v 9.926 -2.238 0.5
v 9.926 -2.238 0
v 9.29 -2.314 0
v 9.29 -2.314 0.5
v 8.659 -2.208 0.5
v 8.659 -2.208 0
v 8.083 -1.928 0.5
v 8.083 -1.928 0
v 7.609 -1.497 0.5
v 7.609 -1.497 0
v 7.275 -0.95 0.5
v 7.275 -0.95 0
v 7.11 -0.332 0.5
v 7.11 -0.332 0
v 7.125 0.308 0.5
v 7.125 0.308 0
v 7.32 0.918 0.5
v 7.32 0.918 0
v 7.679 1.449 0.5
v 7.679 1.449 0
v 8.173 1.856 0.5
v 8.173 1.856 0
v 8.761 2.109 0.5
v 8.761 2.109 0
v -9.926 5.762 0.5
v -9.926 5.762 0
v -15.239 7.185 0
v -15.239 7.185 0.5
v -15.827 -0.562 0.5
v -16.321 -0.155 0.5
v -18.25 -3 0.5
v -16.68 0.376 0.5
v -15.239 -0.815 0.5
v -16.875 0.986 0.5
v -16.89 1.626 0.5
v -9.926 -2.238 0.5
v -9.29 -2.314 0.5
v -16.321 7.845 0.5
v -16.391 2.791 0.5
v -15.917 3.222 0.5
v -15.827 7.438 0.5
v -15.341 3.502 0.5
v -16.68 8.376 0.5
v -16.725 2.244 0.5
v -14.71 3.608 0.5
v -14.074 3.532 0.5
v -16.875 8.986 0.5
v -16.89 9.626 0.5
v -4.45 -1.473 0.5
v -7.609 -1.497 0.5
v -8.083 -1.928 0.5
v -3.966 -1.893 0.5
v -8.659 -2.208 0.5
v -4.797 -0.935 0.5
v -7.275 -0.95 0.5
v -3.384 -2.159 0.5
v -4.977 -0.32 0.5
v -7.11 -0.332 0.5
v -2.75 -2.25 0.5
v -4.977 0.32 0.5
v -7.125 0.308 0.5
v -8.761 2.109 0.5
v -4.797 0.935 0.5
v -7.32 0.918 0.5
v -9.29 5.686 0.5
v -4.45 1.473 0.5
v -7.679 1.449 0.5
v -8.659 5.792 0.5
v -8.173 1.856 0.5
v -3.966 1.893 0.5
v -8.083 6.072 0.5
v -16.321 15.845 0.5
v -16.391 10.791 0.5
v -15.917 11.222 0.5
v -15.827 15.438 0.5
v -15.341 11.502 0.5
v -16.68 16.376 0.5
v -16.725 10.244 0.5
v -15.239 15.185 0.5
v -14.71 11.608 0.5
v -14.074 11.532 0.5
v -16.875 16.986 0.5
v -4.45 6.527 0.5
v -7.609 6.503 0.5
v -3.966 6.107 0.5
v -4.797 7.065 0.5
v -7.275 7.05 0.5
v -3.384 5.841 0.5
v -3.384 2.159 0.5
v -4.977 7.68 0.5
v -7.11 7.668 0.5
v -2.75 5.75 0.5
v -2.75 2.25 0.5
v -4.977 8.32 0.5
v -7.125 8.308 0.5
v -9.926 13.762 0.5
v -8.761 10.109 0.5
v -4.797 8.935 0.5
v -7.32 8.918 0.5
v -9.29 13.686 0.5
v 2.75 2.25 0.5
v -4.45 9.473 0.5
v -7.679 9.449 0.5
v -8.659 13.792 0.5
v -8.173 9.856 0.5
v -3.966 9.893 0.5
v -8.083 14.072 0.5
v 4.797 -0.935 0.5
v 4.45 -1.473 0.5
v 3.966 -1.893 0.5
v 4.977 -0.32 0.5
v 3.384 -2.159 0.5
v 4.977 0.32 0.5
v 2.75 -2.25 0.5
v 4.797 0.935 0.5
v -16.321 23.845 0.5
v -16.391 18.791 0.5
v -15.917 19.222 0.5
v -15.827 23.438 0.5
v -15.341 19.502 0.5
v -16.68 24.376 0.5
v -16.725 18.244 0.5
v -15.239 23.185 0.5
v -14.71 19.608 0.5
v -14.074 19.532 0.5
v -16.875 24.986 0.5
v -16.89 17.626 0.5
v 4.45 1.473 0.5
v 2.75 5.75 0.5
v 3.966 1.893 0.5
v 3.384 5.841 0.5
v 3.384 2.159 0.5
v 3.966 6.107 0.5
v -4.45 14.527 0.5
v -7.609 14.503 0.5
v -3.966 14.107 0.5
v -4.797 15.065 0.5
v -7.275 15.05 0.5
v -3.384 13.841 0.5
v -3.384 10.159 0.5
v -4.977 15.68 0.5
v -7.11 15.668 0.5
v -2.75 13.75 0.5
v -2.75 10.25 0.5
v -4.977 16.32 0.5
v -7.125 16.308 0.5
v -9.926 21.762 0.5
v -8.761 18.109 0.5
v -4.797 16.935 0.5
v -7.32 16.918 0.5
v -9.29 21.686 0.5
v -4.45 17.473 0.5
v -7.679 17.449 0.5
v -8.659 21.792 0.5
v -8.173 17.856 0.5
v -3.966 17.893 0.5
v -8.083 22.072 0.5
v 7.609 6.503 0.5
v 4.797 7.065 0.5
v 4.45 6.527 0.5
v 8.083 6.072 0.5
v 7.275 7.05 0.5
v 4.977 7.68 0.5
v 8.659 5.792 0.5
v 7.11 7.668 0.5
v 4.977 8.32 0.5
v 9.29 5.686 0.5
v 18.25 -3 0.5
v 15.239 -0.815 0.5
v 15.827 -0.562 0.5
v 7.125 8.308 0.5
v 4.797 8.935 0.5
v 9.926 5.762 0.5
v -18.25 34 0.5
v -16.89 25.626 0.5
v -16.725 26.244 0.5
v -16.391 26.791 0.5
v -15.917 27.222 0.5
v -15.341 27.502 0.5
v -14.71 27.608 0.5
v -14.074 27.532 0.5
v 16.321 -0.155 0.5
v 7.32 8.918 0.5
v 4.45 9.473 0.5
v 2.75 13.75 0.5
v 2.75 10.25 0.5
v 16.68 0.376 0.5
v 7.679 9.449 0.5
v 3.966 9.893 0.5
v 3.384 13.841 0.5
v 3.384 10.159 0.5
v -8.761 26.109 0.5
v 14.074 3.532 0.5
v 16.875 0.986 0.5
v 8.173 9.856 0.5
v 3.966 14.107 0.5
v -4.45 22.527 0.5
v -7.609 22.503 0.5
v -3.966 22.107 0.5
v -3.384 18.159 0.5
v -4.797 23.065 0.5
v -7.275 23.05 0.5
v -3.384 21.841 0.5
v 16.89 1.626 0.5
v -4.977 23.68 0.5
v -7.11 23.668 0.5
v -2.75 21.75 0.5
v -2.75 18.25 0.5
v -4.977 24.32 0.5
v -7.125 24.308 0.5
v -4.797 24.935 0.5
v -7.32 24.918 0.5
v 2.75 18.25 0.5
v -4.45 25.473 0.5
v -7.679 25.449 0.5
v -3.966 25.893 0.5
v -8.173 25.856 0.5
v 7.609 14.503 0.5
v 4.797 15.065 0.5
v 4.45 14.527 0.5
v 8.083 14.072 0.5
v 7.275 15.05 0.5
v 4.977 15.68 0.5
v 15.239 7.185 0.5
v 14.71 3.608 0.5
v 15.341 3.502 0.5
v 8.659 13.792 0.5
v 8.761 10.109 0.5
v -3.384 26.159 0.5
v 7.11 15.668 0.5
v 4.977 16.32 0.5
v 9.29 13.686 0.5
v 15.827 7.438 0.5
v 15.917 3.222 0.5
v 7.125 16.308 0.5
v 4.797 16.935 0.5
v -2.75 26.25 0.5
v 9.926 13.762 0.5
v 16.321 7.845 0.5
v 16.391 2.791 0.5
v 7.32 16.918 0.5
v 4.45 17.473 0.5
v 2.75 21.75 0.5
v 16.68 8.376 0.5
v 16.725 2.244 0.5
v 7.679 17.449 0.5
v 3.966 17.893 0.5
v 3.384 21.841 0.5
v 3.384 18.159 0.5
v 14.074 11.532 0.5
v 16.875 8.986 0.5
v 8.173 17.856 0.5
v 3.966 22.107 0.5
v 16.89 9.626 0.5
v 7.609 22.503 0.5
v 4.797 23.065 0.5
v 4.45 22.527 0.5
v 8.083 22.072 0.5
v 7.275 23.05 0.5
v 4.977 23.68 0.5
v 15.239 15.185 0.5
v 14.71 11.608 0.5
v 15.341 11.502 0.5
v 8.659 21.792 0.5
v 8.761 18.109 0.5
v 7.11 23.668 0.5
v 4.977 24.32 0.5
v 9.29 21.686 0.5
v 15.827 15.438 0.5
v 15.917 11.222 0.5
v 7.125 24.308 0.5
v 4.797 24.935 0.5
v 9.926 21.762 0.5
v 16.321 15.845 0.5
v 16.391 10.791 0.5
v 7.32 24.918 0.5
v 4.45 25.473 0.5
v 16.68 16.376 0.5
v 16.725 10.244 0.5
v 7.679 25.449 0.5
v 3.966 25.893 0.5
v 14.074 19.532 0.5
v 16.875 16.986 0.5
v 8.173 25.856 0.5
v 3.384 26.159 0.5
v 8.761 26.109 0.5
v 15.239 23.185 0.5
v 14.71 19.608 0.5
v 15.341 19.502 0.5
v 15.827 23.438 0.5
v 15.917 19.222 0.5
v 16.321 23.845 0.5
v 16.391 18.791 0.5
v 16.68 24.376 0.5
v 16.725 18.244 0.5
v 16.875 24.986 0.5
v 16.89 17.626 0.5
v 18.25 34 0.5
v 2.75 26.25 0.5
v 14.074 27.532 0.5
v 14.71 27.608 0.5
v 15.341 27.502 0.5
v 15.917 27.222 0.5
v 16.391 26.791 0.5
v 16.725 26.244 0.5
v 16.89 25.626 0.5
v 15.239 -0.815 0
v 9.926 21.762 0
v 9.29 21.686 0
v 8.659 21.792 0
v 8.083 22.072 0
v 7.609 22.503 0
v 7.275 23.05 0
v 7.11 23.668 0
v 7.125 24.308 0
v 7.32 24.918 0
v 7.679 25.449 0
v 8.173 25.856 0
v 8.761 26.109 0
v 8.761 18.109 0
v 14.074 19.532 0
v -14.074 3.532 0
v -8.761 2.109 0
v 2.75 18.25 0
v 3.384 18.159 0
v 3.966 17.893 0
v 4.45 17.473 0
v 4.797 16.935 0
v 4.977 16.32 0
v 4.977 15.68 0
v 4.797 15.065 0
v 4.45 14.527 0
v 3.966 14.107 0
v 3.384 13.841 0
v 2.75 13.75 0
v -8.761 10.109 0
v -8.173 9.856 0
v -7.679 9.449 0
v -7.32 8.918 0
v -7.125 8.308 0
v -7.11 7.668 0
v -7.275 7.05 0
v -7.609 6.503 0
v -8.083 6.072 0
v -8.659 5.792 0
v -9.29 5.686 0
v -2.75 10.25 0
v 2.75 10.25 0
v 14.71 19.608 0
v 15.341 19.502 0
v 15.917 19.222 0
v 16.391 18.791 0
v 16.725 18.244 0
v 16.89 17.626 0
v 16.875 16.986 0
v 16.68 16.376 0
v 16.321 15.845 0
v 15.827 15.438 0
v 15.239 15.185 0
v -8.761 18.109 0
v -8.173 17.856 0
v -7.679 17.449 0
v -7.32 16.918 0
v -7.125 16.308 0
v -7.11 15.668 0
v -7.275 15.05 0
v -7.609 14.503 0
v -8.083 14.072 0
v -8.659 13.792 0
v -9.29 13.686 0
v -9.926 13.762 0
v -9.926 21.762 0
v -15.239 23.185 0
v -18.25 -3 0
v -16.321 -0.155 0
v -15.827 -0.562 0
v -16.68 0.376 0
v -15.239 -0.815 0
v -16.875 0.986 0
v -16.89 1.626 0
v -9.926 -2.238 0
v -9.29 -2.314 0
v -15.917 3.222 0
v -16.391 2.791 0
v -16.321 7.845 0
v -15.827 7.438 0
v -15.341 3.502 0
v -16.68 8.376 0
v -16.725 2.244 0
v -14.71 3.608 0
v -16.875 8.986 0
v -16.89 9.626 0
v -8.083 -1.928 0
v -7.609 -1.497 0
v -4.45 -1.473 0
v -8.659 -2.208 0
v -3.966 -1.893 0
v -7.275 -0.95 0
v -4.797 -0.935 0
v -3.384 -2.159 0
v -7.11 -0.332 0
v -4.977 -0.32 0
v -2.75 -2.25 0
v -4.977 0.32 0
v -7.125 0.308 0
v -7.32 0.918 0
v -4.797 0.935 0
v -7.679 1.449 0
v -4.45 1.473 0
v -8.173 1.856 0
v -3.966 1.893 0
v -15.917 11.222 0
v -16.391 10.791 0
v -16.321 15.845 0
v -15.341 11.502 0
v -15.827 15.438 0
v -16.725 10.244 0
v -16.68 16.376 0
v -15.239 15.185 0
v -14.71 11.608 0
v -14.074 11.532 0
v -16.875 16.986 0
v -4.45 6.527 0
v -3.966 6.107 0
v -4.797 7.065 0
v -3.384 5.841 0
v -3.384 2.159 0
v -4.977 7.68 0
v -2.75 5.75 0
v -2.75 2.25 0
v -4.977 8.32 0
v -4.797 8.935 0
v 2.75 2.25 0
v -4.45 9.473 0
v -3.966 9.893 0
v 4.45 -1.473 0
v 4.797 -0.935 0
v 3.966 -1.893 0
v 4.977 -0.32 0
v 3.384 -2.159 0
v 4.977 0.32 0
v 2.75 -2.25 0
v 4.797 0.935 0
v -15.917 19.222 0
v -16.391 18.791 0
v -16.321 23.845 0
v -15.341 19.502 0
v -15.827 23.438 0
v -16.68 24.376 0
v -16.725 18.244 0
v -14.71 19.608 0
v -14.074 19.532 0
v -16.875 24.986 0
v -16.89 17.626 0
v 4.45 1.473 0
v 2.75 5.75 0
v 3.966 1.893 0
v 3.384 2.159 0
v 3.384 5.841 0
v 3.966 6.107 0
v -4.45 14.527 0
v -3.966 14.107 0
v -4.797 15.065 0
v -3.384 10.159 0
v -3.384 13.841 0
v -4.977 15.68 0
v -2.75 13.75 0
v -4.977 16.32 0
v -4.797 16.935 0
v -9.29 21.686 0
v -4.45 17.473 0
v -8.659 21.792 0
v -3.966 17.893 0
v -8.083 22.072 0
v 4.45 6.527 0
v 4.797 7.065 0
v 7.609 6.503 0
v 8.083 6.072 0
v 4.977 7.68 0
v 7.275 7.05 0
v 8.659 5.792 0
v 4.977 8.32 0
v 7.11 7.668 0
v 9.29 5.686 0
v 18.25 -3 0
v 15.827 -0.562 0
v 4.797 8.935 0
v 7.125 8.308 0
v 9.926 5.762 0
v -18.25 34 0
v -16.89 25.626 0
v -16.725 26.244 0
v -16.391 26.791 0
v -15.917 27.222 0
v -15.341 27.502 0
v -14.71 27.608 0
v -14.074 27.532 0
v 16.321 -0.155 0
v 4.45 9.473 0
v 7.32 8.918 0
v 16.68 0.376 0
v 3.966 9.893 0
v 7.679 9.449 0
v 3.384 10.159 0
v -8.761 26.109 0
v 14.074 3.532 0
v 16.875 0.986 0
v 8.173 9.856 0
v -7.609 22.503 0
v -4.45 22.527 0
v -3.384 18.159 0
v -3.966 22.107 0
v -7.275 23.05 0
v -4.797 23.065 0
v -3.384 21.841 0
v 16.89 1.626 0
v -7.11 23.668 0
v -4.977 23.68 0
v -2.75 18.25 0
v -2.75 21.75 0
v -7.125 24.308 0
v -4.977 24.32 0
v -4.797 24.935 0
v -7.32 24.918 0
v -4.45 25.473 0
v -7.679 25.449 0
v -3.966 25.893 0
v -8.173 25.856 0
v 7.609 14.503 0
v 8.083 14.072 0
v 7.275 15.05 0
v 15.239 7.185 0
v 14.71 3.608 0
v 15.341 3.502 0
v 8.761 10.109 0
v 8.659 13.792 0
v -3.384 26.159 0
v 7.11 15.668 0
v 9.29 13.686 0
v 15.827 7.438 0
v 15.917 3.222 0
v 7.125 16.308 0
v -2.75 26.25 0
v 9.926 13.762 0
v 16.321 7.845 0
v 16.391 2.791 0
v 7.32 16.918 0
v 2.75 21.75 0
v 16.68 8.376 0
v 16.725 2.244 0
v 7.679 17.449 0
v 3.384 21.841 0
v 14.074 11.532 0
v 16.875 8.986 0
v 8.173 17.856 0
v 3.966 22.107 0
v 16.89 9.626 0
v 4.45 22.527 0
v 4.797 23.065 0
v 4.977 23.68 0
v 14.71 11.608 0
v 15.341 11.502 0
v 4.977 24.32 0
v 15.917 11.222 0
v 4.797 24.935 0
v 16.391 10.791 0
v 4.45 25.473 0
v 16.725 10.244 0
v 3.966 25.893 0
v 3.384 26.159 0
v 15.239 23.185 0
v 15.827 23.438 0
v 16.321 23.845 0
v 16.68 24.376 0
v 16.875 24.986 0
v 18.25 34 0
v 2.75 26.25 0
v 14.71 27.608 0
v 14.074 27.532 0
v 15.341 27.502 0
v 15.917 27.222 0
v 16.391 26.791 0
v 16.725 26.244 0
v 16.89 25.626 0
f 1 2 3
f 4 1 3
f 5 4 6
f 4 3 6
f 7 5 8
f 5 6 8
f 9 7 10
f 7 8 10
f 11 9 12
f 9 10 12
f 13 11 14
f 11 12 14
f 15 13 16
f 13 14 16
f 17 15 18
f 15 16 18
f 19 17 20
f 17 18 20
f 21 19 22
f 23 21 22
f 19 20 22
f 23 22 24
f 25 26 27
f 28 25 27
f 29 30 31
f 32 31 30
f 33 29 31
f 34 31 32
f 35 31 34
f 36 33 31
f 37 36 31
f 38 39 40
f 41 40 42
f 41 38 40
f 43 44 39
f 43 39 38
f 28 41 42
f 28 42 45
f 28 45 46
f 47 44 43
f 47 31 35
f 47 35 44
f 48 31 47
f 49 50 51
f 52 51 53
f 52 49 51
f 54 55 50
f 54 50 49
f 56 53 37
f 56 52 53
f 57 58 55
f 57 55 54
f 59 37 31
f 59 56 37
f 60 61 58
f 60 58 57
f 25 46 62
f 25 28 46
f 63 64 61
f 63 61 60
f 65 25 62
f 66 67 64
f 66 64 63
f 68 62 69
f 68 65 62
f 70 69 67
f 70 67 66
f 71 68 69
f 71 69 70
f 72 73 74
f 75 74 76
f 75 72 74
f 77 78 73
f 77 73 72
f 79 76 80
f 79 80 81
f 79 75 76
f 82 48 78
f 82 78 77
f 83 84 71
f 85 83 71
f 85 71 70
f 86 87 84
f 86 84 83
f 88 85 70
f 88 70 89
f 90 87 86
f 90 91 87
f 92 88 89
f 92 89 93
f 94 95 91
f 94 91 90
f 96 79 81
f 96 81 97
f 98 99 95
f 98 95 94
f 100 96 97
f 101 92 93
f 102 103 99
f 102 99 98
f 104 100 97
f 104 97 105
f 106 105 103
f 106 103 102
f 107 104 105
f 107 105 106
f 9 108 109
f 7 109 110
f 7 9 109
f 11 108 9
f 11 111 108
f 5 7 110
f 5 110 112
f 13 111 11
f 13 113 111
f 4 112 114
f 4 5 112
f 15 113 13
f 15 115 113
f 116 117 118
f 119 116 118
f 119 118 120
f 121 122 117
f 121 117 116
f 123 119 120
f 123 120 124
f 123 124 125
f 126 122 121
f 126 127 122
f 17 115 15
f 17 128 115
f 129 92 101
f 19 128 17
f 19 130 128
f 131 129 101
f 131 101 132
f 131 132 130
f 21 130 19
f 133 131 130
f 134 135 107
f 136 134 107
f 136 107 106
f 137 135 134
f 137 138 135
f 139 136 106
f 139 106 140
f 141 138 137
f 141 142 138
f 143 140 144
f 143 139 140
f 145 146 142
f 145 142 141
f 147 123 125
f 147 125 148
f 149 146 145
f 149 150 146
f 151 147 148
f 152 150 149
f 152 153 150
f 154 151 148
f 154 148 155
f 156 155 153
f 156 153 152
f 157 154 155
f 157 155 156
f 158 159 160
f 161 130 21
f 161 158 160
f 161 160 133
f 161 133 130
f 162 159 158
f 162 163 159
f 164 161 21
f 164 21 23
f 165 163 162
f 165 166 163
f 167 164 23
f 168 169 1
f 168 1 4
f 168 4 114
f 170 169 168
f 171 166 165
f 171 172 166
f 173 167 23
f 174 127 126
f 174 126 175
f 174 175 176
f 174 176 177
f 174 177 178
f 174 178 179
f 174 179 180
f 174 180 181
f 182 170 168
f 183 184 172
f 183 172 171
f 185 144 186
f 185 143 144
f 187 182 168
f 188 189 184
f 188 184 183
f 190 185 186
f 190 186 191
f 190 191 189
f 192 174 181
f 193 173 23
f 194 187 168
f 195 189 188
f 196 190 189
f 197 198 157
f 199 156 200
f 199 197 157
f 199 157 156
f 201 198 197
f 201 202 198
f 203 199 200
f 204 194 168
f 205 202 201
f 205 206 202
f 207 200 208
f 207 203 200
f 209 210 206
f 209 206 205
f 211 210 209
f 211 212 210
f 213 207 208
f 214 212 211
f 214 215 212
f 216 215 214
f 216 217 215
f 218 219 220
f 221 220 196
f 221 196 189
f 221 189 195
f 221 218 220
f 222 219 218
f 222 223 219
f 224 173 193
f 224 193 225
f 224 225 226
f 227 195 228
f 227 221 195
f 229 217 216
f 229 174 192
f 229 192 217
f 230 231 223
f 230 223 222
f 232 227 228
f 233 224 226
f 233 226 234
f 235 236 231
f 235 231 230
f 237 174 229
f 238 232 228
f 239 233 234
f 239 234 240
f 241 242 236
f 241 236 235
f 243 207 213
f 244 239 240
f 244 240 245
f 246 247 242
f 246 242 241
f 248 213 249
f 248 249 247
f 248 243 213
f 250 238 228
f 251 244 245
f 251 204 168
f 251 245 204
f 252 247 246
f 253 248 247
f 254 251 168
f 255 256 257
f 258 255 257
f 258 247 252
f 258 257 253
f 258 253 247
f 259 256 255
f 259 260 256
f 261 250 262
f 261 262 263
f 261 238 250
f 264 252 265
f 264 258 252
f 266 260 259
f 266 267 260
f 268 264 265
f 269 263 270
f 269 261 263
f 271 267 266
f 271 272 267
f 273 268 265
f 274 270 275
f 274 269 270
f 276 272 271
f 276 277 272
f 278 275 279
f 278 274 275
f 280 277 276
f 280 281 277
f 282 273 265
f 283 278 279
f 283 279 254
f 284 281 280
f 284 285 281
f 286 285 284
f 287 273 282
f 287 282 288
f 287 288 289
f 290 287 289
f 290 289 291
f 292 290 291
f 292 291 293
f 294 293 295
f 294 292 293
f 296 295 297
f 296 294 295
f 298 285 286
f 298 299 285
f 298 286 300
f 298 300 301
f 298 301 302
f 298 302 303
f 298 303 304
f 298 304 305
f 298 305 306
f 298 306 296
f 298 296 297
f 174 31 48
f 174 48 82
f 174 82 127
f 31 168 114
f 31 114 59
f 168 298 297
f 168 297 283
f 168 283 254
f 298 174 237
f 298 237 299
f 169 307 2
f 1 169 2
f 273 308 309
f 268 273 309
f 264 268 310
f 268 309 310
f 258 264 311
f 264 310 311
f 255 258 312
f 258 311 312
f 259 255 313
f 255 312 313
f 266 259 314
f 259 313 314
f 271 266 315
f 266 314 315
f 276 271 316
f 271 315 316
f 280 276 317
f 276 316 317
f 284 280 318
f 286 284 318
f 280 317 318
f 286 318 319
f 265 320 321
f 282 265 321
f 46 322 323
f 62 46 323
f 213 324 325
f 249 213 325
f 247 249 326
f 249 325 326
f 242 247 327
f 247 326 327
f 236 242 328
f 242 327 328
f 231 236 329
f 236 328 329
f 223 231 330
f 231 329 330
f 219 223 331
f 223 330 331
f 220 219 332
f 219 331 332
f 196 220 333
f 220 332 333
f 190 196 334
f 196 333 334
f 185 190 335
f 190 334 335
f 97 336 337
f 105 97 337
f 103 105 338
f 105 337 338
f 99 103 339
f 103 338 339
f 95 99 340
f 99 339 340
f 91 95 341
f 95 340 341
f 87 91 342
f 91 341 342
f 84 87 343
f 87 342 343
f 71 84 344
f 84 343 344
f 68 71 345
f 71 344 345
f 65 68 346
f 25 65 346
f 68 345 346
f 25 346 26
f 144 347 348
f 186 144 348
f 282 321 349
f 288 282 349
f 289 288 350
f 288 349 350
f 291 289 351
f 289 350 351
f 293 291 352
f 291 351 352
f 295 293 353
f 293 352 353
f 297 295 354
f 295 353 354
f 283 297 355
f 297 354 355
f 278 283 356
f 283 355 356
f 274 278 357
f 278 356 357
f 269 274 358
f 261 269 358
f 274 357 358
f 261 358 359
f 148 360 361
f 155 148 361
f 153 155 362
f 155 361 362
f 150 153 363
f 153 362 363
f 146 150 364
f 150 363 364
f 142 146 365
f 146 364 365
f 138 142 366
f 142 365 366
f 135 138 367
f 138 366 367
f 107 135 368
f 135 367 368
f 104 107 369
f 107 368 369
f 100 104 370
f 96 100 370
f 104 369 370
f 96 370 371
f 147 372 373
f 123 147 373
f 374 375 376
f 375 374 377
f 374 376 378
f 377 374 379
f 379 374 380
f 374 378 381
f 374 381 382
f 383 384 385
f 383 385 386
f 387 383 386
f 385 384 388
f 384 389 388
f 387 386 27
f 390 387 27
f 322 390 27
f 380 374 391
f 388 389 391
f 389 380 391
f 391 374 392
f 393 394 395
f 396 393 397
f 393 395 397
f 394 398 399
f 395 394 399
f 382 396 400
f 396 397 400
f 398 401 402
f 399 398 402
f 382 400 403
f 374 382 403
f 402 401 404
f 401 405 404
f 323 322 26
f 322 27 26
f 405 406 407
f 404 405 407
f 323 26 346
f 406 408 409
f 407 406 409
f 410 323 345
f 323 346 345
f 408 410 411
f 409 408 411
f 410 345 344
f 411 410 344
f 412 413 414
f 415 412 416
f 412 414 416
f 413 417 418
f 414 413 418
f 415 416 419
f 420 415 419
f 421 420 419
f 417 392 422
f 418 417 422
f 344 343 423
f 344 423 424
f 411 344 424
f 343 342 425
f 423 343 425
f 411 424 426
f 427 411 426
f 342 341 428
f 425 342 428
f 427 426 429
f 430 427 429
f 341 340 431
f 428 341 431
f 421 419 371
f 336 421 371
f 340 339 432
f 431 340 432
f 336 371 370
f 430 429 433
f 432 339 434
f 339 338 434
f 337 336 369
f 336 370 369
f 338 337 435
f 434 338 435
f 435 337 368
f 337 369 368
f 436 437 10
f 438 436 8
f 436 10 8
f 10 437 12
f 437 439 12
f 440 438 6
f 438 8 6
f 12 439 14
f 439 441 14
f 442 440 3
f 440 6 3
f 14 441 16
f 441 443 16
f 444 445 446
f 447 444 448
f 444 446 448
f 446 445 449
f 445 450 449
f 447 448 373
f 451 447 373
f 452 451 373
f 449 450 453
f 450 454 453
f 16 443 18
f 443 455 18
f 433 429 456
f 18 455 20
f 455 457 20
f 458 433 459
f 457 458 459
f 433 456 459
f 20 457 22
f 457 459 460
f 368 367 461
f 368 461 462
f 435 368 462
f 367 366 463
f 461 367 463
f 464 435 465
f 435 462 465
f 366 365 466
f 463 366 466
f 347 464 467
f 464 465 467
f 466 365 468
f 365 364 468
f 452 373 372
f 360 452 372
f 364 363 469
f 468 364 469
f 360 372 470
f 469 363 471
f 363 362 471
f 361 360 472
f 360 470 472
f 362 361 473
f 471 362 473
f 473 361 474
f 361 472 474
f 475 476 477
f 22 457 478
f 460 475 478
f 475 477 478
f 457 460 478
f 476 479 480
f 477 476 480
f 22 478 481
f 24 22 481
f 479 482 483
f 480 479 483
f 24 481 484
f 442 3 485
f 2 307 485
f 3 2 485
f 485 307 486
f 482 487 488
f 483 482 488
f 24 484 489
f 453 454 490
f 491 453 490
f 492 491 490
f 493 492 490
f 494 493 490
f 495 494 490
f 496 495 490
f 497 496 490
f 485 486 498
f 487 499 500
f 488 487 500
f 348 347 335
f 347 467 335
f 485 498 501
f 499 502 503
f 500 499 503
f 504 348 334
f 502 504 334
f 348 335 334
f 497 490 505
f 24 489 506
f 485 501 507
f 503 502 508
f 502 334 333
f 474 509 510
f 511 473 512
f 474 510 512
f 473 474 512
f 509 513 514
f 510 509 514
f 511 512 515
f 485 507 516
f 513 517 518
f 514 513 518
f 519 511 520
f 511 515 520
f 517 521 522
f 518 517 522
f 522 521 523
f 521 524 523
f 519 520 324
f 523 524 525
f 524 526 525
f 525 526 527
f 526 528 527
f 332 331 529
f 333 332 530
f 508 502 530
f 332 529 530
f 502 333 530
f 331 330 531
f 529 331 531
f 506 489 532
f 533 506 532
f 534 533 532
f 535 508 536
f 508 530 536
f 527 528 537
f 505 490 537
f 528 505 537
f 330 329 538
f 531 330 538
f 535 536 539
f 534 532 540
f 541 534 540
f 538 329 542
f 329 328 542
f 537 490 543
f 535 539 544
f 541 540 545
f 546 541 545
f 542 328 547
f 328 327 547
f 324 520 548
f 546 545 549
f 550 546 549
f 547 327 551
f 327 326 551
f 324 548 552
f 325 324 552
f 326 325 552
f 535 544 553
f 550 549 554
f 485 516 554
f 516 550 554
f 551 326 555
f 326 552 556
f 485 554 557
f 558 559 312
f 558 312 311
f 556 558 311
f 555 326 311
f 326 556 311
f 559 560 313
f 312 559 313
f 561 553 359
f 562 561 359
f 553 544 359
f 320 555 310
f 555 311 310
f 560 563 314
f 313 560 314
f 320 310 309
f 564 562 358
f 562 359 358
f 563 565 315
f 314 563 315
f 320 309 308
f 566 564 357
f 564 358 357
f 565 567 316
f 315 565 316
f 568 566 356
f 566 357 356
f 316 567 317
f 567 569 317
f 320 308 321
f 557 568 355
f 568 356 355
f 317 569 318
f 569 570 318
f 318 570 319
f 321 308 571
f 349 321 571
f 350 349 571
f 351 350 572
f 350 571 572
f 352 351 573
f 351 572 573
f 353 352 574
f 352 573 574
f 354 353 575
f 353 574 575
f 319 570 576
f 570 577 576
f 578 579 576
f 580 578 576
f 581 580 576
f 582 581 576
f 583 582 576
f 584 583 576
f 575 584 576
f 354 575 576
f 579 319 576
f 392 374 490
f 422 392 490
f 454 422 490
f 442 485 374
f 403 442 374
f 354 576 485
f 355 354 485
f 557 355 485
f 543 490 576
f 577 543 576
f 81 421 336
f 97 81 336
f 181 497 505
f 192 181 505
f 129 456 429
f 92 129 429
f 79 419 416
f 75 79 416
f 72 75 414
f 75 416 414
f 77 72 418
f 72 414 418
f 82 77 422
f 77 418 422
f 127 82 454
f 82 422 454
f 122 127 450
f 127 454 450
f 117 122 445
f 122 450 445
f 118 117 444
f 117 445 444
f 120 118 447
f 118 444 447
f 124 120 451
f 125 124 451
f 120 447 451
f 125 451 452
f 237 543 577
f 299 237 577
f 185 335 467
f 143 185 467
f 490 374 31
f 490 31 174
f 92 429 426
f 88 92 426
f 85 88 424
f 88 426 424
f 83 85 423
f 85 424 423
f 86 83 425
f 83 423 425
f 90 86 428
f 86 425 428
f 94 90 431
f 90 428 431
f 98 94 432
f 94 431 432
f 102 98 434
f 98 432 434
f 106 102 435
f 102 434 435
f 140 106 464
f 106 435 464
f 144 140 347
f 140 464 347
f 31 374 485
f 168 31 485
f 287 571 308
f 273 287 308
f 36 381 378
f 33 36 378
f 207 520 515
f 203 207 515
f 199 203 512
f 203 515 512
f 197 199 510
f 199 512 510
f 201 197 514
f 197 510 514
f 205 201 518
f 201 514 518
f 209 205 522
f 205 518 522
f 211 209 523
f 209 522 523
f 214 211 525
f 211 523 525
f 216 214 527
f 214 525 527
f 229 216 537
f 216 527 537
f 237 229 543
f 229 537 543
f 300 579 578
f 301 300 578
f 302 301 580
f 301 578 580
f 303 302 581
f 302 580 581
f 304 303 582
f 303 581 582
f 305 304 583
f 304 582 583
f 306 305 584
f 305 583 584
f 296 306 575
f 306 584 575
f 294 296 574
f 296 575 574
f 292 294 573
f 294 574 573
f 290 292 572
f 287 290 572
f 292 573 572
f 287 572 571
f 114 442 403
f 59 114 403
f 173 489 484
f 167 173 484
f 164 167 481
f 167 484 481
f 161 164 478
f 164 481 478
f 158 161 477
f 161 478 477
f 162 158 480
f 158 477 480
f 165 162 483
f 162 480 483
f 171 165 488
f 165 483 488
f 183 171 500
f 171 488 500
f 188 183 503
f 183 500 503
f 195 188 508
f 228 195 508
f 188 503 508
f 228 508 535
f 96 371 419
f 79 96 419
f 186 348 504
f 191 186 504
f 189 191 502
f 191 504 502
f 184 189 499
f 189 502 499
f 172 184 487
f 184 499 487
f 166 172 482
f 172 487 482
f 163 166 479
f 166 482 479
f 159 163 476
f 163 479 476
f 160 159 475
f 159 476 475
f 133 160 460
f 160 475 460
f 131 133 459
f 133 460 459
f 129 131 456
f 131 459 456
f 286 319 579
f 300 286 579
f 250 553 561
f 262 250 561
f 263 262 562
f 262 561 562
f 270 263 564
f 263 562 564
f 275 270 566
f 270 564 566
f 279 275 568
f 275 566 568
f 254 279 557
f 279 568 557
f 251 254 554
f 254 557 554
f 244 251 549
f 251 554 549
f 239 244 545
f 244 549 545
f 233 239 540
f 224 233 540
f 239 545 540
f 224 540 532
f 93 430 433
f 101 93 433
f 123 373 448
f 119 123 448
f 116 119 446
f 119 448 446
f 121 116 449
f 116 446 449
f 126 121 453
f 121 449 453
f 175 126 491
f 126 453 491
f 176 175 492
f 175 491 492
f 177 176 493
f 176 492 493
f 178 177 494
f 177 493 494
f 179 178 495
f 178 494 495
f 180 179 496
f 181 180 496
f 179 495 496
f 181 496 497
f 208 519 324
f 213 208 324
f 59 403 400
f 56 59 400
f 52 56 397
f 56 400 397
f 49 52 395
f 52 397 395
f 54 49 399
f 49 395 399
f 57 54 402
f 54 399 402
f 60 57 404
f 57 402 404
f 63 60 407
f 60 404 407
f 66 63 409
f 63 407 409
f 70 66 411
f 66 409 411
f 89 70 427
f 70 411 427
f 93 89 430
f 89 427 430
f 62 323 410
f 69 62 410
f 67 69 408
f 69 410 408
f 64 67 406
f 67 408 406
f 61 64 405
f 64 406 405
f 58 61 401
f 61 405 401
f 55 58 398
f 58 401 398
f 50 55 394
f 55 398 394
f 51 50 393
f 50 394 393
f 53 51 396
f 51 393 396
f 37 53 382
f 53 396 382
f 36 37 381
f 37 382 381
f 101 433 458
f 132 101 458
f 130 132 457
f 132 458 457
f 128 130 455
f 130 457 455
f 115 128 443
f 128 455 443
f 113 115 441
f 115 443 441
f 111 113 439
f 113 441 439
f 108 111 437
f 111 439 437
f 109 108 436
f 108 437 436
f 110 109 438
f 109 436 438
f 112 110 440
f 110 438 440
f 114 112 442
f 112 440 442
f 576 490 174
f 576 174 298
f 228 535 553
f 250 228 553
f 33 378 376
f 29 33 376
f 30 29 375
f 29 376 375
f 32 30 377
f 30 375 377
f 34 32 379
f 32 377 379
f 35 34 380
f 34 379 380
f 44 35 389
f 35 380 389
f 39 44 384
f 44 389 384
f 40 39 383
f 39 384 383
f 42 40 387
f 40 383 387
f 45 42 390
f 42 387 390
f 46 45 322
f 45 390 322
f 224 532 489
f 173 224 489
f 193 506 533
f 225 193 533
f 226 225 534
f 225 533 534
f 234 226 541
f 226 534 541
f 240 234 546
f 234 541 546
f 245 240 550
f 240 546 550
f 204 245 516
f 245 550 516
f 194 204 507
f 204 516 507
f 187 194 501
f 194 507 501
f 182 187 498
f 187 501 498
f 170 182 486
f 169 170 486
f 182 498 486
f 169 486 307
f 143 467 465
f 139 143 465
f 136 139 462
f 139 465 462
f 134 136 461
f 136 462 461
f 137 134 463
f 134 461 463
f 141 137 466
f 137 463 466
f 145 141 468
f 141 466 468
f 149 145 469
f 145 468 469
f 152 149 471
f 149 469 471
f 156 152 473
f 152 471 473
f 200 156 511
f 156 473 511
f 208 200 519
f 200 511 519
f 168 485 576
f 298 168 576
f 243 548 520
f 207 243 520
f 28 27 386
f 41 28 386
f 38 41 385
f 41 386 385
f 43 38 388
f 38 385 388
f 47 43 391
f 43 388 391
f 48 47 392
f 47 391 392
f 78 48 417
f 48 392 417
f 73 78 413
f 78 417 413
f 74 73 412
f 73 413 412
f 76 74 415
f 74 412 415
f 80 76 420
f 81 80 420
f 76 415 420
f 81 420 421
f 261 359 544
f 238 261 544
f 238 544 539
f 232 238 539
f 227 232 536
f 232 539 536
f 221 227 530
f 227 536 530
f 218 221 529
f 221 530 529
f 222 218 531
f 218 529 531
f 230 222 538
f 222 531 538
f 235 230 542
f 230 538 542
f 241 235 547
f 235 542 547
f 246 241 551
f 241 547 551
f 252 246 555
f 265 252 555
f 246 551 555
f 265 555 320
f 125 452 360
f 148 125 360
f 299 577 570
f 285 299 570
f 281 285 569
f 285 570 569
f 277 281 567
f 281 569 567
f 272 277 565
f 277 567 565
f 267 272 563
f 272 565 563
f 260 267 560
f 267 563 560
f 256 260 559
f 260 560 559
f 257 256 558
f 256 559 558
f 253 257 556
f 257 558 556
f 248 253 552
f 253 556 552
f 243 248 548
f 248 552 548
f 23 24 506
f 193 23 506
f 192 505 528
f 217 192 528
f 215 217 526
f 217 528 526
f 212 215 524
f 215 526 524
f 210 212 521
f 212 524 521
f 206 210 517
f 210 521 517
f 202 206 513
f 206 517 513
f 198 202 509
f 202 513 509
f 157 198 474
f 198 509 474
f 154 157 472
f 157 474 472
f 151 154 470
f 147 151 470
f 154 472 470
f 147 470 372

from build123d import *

# Parameters (mm, degrees)
SKETCH1_W          = 36.5
SKETCH1_H          = 37
EXTRUDE1_DEPTH     = 0.5
CUT_EXTRUDE1_DEPTH = 39.591611783
LPATTERN1_COUNT    = 4
LPATTERN1_PITCH    = 8


with BuildPart() as part:
    # Sketch1 → Extrude1 (new body)
    with BuildSketch(Plane.XY):
        with Locations((0, 15.5)):
            Rectangle(SKETCH1_W, SKETCH1_H)
    extrude(amount=EXTRUDE1_DEPTH)

    # Sketch2 → Cut-Extrude1 (cut, through all)
    with BuildSketch(Plane(origin=(0, 0, 0), x_dir=(-1, 0, 0), z_dir=(0, 0, -1))):
        with BuildLine():
            Line((-15.238638874, 23.185419265), (-9.926046829, 21.761914517))
            ThreePointArc((-9.926046829, 21.761914517), (-7.170370869, 23.352904774), (-8.761361126, 26.108580735))
            Line((-8.761361126, 26.108580735), (-14.073953171, 27.532085483))
            ThreePointArc((-14.073953171, 27.532085483), (-16.829629131, 25.941095226), (-15.238638874, 23.185419265))
        make_face()
        with BuildLine():
            Line((-2.75, 21.75), (2.75, 21.75))
            ThreePointArc((2.75, 21.75), (5, 24), (2.75, 26.25))
            Line((2.75, 26.25), (-2.75, 26.25))
            ThreePointArc((-2.75, 26.25), (-5, 24), (-2.75, 21.75))
        make_face()
        with BuildLine():
            Line((9.926046829, 21.761914517), (15.238638874, 23.185419265))
            ThreePointArc((15.238638874, 23.185419265), (16.829629131, 25.941095226), (14.073953171, 27.532085483))
            Line((14.073953171, 27.532085483), (8.761361126, 26.108580735))
            ThreePointArc((8.761361126, 26.108580735), (7.170370869, 23.352904774), (9.926046829, 21.761914517))
        make_face()
    cut_extrude1 = extrude(amount=-CUT_EXTRUDE1_DEPTH, mode=Mode.SUBTRACT)

    # LPattern1: Cut-Extrude1 ×4
    with Locations(*[(0, -i * LPATTERN1_PITCH, 0) for i in range(1, LPATTERN1_COUNT)]):
        add(cut_extrude1, mode=Mode.SUBTRACT)


solid = part.part
